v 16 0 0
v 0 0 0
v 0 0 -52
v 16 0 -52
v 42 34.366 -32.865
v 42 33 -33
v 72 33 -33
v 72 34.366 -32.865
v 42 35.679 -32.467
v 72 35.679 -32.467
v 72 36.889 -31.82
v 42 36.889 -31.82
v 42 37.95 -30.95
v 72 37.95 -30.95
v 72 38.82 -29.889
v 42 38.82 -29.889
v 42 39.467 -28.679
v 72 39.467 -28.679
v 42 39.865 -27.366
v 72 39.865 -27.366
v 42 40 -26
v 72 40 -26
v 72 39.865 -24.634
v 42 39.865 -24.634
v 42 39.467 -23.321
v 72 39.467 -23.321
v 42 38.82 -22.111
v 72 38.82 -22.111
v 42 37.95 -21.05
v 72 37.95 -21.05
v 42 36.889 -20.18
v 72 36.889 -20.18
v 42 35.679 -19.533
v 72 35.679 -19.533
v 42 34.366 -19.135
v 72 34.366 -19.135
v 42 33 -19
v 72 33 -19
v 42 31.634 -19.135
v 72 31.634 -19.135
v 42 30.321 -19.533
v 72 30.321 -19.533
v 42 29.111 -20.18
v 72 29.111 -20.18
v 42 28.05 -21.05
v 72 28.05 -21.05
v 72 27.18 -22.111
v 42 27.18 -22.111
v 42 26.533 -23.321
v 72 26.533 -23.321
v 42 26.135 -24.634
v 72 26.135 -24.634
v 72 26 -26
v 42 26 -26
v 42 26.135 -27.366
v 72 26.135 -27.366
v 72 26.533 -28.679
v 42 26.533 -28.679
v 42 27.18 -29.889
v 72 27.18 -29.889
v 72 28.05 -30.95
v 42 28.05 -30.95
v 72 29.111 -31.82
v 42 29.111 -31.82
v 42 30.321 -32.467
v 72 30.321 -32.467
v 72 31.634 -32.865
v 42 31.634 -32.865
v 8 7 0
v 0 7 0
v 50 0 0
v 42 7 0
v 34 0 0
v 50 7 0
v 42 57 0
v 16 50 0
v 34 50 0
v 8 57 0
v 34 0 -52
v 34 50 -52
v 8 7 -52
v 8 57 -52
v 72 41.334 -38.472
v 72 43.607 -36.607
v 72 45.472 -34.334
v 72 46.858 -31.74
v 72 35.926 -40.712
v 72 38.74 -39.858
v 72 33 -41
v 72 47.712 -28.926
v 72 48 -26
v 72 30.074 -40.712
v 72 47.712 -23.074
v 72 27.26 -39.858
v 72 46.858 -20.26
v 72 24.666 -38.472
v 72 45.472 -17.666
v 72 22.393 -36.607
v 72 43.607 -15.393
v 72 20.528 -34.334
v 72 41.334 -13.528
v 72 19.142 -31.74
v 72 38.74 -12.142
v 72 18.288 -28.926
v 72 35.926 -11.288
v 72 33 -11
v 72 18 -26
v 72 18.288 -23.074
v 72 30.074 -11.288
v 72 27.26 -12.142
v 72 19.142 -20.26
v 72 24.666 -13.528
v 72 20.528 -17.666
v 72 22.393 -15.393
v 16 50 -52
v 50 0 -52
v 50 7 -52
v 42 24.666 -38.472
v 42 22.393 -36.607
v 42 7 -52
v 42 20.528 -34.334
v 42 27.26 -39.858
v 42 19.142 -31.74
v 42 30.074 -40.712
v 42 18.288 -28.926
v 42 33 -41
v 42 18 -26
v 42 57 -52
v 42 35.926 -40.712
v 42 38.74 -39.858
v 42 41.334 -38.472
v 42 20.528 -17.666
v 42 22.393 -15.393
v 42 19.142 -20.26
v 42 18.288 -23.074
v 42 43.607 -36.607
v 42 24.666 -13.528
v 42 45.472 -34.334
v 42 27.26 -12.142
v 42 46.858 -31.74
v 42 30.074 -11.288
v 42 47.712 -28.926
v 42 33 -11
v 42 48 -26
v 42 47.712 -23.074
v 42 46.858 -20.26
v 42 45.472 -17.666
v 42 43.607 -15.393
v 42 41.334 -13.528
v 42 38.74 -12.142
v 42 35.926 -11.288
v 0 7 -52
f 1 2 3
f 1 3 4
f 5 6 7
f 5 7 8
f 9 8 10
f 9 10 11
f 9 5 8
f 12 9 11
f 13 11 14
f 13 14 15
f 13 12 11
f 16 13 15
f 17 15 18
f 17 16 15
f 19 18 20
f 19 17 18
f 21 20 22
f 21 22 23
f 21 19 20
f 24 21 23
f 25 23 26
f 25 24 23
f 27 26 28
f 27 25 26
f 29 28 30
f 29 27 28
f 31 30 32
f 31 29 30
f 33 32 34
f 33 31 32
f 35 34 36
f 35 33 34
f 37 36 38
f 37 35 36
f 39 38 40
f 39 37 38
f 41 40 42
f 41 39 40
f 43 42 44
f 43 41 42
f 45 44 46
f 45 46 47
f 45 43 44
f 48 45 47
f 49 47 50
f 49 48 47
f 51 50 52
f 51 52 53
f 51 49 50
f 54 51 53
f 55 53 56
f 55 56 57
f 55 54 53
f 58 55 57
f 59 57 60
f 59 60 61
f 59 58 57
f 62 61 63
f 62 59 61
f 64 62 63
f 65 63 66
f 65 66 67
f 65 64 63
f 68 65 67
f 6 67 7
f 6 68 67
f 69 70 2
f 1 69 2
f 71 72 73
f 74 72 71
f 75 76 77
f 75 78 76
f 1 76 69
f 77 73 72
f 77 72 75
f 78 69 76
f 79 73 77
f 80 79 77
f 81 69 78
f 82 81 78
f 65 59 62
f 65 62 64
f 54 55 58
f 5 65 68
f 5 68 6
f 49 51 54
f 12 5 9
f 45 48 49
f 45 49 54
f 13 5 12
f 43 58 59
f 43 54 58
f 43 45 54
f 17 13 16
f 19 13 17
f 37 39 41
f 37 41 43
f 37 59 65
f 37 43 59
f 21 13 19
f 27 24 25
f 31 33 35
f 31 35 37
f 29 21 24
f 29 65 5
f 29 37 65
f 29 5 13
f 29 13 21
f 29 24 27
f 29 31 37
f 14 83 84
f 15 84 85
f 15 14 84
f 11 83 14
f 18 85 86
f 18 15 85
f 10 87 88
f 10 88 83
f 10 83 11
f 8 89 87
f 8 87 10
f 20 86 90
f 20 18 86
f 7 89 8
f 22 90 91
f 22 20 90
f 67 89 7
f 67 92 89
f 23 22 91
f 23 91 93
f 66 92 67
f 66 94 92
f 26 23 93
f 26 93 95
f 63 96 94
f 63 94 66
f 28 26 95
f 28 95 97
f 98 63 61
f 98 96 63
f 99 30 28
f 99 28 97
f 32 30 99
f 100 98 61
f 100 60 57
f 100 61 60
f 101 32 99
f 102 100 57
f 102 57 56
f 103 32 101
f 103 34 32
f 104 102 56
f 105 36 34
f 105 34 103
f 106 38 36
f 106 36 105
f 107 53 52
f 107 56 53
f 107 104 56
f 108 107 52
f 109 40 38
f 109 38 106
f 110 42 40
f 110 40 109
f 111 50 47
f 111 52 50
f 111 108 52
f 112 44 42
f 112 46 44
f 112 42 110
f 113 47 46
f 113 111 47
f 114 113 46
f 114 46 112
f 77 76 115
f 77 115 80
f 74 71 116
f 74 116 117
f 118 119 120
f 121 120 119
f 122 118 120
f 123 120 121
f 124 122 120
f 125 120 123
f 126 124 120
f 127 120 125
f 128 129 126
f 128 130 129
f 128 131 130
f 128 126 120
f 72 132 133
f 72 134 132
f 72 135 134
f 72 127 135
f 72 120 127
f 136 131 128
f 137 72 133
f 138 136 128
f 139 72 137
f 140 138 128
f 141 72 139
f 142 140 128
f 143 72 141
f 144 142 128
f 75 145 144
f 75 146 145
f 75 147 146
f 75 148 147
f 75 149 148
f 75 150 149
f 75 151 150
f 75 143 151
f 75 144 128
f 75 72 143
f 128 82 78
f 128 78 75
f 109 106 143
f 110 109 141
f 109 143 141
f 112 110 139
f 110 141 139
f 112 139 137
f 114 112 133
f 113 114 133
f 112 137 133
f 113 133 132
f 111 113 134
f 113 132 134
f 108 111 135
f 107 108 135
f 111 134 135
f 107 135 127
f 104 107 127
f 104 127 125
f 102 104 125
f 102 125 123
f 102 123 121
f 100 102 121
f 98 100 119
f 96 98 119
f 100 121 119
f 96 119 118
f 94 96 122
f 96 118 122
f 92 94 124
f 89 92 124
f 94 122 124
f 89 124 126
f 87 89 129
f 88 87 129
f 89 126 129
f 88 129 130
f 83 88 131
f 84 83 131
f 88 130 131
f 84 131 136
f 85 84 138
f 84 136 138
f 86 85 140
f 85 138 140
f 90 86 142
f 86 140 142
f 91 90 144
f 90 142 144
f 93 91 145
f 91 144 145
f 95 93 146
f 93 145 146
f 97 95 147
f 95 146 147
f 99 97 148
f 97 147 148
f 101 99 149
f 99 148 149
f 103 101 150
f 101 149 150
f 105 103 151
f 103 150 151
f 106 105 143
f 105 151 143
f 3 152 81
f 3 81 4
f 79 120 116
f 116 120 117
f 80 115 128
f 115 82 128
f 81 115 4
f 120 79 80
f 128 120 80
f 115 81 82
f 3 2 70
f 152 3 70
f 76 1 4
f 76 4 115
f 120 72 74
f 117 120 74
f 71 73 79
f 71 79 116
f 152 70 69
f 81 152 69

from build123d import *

# Parameters (mm, degrees)
SKETCH1_W           = 50
SKETCH1_H           = 57
BOSS_EXTRUDE1_DEPTH = 52
SKETCH2_W           = 18
SKETCH2_H           = 50
CUT_EXTRUDE1_DEPTH  = 52
SKETCH3_W           = 8
SKETCH3_H           = 50
CUT_EXTRUDE2_DEPTH  = 52
SKETCH4_R           = 15
SKETCH4_R_2         = 7
BOSS_EXTRUDE2_DEPTH = 30


with BuildPart() as part:
    # Sketch1 → Boss-Extrude1 (new body)
    with BuildSketch(Plane.XY):
        with Locations((25, 28.5)):
            Rectangle(SKETCH1_W, SKETCH1_H)
    extrude(amount=-BOSS_EXTRUDE1_DEPTH)

    # Sketch2 → Cut-Extrude1 (cut)
    with BuildSketch(Plane.XY):
        with Locations((25, 25)):
            Rectangle(SKETCH2_W, SKETCH2_H)
    extrude(amount=-CUT_EXTRUDE1_DEPTH, mode=Mode.SUBTRACT)

    # Sketch3 → Cut-Extrude2 (cut)
    with BuildSketch(Plane.XY):
        with Locations((46, 32)):
            Rectangle(SKETCH3_W, SKETCH3_H)
        with Locations((4, 32)):
            Rectangle(SKETCH3_W, SKETCH3_H)
    extrude(amount=-CUT_EXTRUDE2_DEPTH, mode=Mode.SUBTRACT)

    # Sketch4 → Boss-Extrude2 (add)
    with BuildSketch(Plane(origin=(42, 0, 0), x_dir=(0, 0, -1), z_dir=(1, 0, 0))):
        with Locations(Location((26, 33, 0), (0, 0, 180))):
            Circle(SKETCH4_R)
        with Locations((26, 33)):
            Circle(SKETCH4_R_2, mode=Mode.SUBTRACT)
    extrude(amount=BOSS_EXTRUDE2_DEPTH)


solid = part.part
